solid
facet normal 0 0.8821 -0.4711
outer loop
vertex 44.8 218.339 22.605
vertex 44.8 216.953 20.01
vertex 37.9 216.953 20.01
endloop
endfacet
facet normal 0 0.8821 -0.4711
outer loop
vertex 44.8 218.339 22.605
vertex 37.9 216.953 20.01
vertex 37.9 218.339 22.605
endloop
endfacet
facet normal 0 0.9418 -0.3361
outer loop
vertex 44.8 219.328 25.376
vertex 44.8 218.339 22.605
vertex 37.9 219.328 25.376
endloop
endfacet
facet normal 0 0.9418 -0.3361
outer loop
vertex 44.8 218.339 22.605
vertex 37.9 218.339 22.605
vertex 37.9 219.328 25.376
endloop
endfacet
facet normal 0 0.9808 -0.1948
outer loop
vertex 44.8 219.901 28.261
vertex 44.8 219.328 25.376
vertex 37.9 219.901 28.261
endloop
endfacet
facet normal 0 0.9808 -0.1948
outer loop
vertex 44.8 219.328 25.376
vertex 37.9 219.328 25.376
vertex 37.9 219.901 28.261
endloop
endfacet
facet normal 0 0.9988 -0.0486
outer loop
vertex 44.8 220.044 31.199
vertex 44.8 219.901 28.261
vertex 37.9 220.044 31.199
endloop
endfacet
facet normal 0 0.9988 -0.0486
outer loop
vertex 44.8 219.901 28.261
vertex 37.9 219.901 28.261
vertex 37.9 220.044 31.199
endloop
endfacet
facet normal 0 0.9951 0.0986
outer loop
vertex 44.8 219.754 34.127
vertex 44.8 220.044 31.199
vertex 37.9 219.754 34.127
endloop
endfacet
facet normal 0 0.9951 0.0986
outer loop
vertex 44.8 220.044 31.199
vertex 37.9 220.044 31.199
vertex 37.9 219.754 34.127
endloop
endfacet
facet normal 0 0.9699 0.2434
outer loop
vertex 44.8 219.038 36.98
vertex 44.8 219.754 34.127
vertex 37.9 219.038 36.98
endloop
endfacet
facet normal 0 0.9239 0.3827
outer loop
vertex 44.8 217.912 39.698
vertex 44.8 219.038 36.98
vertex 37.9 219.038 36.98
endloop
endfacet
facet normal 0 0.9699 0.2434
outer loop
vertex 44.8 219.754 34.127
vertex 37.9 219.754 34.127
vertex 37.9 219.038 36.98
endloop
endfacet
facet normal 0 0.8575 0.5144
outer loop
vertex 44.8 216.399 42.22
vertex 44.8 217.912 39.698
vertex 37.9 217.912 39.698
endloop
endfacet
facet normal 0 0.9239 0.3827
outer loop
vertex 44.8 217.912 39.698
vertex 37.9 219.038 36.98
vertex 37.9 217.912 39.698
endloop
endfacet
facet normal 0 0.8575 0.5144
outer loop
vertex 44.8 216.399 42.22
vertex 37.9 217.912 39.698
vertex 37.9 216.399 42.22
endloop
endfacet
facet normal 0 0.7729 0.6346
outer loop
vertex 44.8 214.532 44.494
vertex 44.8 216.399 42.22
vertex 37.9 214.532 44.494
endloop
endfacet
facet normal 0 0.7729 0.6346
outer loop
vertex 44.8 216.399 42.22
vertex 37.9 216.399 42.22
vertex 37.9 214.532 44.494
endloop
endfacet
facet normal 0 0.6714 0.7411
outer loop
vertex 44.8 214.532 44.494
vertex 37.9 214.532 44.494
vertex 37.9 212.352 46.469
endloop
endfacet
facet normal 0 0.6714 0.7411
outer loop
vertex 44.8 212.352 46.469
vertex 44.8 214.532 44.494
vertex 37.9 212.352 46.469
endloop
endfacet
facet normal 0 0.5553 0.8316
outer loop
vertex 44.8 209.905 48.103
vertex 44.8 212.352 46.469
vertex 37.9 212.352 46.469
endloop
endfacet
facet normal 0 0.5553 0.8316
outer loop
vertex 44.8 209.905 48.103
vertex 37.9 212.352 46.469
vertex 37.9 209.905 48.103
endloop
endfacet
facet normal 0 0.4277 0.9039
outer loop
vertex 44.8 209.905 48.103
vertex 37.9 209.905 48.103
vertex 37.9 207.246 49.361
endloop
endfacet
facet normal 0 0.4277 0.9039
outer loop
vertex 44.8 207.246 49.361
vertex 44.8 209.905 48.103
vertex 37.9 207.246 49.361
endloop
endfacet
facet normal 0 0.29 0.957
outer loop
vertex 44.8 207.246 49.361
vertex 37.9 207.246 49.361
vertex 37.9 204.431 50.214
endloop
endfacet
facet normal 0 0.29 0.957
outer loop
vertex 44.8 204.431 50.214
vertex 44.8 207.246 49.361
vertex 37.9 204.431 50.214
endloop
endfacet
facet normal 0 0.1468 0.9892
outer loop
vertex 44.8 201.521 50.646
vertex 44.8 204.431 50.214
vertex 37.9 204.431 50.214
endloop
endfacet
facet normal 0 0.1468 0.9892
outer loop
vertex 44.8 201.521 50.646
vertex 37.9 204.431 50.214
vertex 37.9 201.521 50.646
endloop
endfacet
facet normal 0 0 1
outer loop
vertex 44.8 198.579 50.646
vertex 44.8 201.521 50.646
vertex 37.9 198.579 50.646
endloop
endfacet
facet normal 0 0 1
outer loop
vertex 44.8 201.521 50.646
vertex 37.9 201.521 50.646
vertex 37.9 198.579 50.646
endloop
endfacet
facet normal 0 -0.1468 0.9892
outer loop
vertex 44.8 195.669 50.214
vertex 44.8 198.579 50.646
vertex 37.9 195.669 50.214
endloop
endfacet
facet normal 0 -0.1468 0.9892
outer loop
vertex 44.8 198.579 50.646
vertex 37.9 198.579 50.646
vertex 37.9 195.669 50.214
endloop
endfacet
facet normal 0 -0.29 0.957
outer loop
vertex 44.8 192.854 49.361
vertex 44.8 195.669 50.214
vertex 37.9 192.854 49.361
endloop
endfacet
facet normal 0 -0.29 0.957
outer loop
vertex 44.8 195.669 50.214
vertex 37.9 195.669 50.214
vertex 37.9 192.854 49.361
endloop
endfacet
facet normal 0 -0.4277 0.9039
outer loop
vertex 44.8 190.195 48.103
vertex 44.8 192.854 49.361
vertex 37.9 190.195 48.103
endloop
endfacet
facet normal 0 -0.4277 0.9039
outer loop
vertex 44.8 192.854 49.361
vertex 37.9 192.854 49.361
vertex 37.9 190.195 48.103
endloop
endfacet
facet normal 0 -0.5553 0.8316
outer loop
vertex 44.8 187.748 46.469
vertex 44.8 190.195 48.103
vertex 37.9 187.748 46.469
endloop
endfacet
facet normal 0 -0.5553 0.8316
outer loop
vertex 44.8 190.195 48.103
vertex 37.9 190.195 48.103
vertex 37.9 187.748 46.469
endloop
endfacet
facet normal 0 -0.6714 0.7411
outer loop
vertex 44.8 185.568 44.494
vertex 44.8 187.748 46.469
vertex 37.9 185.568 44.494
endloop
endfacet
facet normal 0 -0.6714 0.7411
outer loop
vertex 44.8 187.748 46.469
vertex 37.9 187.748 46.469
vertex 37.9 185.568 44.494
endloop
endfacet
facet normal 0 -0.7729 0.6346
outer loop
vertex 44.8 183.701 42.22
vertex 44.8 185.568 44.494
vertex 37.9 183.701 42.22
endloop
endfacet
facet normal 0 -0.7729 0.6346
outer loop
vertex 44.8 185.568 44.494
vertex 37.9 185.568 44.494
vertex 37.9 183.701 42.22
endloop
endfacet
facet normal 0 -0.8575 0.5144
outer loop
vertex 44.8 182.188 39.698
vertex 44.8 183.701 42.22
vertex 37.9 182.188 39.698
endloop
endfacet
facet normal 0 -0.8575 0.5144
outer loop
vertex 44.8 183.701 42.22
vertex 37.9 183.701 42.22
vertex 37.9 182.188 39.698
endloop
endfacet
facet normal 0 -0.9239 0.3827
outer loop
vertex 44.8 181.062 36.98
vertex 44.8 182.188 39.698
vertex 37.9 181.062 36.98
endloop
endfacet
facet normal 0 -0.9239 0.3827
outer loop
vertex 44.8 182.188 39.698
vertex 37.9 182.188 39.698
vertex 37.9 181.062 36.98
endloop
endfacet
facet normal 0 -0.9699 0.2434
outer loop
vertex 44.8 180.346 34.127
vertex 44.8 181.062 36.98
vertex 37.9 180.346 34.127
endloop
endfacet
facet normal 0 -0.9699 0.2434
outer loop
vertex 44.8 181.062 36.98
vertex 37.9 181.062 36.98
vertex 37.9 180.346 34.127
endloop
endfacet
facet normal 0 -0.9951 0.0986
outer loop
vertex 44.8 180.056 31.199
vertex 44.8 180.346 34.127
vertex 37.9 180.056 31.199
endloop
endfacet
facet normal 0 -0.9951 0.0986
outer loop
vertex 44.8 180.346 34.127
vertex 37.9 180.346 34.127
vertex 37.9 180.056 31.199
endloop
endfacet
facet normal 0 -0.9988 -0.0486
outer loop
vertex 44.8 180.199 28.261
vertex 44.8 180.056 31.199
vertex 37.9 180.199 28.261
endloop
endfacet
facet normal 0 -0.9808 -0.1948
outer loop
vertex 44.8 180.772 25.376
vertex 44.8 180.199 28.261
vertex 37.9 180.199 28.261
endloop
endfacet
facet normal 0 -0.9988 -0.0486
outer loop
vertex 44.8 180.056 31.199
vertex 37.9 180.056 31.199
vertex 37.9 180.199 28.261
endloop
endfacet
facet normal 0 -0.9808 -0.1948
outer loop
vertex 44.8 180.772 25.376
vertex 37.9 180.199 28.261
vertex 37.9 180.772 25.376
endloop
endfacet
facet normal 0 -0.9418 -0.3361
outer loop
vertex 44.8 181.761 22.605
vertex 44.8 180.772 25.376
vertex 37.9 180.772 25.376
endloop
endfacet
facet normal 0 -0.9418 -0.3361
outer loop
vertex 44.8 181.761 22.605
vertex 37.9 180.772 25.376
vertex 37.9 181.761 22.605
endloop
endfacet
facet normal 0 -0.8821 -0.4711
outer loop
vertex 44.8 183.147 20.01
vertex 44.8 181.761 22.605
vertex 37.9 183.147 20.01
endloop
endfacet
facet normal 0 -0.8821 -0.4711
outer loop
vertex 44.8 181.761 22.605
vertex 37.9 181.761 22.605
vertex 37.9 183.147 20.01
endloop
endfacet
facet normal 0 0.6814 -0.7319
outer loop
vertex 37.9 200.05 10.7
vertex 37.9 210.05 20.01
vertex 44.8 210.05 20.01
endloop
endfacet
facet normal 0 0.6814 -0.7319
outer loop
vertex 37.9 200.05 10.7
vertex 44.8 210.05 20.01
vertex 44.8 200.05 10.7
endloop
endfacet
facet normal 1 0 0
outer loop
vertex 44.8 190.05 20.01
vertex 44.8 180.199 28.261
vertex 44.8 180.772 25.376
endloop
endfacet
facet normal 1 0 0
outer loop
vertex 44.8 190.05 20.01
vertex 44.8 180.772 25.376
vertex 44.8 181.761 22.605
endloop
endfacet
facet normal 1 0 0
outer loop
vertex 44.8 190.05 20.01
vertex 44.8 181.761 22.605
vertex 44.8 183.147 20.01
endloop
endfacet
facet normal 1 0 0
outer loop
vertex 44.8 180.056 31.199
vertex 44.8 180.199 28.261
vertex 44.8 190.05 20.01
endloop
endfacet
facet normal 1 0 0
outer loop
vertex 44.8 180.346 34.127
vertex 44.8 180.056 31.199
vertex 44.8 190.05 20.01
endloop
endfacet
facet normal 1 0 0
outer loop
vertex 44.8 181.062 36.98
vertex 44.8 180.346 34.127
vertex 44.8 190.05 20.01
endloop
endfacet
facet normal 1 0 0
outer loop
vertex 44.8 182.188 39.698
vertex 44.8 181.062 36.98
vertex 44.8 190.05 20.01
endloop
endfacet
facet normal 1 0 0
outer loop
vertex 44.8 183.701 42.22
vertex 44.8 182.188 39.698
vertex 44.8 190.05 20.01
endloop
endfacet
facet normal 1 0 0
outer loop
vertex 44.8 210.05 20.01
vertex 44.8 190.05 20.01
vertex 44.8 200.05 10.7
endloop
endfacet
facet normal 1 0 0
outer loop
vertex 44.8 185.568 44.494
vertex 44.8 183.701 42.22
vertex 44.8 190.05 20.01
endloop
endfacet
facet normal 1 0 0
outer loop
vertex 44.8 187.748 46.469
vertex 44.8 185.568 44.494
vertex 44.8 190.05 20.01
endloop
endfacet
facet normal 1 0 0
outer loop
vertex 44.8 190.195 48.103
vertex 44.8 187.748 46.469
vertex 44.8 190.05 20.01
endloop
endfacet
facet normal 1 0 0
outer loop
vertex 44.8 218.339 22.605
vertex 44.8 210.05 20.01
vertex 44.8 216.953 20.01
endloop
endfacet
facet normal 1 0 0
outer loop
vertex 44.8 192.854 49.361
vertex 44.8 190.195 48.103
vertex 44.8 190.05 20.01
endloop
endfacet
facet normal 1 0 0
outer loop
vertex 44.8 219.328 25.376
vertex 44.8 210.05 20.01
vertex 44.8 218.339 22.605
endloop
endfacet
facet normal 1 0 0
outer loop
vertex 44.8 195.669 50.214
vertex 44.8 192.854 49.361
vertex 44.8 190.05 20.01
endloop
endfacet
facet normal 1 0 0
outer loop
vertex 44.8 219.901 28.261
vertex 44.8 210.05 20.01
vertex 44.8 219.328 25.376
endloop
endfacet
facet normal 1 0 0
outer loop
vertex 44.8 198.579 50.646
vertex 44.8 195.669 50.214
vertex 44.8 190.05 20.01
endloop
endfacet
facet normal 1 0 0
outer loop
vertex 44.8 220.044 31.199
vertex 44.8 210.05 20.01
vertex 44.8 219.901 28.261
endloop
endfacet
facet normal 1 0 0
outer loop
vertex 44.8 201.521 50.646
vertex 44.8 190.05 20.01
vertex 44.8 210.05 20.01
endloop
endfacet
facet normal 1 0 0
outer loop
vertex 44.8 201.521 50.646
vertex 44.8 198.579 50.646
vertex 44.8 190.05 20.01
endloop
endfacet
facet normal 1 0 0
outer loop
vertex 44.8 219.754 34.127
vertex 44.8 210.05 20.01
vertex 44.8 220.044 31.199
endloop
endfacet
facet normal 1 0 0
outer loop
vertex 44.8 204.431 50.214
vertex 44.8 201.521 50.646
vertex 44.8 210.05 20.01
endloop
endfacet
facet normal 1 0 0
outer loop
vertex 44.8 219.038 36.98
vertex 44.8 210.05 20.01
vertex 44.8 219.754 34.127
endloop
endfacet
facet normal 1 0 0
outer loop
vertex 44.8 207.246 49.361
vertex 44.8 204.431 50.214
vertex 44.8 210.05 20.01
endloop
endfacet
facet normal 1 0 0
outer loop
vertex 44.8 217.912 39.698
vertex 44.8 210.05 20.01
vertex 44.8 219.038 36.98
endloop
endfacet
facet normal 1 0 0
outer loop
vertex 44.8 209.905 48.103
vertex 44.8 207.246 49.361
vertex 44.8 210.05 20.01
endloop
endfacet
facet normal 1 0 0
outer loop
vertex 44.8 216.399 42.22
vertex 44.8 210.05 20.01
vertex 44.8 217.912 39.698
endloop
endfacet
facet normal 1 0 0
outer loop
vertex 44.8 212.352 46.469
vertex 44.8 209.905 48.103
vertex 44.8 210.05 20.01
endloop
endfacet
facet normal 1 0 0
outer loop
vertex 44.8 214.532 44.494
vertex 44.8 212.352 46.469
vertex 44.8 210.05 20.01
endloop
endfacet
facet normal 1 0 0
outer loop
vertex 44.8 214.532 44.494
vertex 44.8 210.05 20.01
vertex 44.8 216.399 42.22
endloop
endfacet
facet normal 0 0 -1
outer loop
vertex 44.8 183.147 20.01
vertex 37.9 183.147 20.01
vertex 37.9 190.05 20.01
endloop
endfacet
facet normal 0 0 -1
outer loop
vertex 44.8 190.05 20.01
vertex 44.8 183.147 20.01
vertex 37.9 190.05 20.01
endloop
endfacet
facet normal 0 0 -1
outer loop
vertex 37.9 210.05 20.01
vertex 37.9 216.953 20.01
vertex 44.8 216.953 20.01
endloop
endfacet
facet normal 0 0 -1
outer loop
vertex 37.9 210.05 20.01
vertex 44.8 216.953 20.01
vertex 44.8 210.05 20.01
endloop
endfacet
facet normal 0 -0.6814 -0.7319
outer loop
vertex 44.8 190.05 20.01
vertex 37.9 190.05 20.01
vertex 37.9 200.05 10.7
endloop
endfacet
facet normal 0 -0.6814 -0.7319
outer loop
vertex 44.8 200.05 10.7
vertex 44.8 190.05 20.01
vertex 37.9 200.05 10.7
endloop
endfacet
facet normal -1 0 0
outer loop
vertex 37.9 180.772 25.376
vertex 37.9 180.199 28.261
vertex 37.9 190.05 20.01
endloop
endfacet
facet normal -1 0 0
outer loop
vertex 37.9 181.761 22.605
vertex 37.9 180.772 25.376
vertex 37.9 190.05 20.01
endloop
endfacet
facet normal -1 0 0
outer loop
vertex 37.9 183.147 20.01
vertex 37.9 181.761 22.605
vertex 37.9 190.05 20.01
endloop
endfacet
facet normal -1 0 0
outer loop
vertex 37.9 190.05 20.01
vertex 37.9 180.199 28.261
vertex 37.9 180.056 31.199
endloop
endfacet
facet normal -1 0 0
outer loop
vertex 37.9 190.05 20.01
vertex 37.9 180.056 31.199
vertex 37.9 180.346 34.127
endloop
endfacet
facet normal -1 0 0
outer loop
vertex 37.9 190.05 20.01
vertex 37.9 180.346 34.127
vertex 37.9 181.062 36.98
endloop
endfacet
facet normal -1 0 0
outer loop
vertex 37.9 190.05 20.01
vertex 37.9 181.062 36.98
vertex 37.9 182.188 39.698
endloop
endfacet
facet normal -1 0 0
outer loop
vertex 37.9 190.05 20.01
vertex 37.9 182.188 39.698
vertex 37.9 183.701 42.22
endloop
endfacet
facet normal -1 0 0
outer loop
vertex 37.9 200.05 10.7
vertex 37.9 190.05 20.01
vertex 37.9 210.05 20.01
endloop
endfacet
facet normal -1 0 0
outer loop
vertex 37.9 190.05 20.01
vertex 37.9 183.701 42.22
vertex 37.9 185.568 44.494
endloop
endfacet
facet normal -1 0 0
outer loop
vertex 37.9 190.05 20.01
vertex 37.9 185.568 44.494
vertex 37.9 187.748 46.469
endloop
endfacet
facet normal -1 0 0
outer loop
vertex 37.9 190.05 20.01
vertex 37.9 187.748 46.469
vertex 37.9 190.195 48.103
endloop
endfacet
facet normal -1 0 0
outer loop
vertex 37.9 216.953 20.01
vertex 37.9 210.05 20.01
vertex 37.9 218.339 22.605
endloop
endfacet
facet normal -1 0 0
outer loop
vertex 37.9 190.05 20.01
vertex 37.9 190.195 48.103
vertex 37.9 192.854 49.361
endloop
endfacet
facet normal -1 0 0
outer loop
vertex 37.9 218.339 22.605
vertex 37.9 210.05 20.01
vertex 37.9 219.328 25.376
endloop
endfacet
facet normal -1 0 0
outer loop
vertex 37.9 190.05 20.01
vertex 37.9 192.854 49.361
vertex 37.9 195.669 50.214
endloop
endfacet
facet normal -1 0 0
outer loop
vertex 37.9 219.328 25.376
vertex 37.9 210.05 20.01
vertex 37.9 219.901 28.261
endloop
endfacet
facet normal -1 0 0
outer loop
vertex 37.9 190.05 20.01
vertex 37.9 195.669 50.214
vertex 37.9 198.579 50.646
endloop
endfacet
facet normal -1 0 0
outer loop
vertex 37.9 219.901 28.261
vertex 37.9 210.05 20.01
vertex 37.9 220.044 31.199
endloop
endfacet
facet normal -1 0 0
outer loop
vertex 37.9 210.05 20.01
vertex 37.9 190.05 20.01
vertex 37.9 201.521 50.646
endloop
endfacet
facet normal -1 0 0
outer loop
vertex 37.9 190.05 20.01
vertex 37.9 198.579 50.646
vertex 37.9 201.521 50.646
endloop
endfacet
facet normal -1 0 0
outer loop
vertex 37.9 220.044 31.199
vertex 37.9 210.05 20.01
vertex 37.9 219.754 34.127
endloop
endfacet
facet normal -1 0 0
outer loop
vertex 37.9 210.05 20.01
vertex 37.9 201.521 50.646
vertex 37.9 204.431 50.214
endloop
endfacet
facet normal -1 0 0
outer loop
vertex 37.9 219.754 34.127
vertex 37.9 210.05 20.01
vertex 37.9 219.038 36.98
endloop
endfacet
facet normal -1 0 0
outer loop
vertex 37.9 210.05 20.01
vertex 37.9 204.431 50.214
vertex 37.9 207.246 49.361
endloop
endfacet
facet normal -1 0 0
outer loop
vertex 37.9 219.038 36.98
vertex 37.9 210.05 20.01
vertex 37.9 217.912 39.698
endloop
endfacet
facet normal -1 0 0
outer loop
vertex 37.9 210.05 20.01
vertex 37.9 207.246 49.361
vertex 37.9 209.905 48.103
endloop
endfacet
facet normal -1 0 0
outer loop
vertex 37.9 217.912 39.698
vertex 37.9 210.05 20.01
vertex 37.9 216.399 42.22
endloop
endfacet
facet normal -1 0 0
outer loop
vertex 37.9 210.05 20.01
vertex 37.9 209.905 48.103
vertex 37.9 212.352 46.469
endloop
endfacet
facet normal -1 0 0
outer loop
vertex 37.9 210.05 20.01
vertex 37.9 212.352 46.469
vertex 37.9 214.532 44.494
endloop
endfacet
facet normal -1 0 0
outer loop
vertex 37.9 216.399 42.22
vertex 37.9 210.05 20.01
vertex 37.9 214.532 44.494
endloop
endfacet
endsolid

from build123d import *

# Parameters (mm, degrees)
PAD008_DEPTH = 6.9


with BuildPart() as part:
    # Sketch018 → Pad008 (new body)
    with BuildSketch(Plane.YZ.offset(37.9)):
        with BuildLine():
            ThreePointArc((216.953369, 20.01), (200.05, 50.7), (183.146631, 20.01))
            Line((183.146631, 20.01), (190.05, 20.01))
            Line((190.05, 20.01), (200.05, 10.7))
            Line((210.05, 20.01), (200.05, 10.7))
            Line((216.953369, 20.01), (210.05, 20.01))
        make_face()
    extrude(amount=PAD008_DEPTH)


solid = part.part
